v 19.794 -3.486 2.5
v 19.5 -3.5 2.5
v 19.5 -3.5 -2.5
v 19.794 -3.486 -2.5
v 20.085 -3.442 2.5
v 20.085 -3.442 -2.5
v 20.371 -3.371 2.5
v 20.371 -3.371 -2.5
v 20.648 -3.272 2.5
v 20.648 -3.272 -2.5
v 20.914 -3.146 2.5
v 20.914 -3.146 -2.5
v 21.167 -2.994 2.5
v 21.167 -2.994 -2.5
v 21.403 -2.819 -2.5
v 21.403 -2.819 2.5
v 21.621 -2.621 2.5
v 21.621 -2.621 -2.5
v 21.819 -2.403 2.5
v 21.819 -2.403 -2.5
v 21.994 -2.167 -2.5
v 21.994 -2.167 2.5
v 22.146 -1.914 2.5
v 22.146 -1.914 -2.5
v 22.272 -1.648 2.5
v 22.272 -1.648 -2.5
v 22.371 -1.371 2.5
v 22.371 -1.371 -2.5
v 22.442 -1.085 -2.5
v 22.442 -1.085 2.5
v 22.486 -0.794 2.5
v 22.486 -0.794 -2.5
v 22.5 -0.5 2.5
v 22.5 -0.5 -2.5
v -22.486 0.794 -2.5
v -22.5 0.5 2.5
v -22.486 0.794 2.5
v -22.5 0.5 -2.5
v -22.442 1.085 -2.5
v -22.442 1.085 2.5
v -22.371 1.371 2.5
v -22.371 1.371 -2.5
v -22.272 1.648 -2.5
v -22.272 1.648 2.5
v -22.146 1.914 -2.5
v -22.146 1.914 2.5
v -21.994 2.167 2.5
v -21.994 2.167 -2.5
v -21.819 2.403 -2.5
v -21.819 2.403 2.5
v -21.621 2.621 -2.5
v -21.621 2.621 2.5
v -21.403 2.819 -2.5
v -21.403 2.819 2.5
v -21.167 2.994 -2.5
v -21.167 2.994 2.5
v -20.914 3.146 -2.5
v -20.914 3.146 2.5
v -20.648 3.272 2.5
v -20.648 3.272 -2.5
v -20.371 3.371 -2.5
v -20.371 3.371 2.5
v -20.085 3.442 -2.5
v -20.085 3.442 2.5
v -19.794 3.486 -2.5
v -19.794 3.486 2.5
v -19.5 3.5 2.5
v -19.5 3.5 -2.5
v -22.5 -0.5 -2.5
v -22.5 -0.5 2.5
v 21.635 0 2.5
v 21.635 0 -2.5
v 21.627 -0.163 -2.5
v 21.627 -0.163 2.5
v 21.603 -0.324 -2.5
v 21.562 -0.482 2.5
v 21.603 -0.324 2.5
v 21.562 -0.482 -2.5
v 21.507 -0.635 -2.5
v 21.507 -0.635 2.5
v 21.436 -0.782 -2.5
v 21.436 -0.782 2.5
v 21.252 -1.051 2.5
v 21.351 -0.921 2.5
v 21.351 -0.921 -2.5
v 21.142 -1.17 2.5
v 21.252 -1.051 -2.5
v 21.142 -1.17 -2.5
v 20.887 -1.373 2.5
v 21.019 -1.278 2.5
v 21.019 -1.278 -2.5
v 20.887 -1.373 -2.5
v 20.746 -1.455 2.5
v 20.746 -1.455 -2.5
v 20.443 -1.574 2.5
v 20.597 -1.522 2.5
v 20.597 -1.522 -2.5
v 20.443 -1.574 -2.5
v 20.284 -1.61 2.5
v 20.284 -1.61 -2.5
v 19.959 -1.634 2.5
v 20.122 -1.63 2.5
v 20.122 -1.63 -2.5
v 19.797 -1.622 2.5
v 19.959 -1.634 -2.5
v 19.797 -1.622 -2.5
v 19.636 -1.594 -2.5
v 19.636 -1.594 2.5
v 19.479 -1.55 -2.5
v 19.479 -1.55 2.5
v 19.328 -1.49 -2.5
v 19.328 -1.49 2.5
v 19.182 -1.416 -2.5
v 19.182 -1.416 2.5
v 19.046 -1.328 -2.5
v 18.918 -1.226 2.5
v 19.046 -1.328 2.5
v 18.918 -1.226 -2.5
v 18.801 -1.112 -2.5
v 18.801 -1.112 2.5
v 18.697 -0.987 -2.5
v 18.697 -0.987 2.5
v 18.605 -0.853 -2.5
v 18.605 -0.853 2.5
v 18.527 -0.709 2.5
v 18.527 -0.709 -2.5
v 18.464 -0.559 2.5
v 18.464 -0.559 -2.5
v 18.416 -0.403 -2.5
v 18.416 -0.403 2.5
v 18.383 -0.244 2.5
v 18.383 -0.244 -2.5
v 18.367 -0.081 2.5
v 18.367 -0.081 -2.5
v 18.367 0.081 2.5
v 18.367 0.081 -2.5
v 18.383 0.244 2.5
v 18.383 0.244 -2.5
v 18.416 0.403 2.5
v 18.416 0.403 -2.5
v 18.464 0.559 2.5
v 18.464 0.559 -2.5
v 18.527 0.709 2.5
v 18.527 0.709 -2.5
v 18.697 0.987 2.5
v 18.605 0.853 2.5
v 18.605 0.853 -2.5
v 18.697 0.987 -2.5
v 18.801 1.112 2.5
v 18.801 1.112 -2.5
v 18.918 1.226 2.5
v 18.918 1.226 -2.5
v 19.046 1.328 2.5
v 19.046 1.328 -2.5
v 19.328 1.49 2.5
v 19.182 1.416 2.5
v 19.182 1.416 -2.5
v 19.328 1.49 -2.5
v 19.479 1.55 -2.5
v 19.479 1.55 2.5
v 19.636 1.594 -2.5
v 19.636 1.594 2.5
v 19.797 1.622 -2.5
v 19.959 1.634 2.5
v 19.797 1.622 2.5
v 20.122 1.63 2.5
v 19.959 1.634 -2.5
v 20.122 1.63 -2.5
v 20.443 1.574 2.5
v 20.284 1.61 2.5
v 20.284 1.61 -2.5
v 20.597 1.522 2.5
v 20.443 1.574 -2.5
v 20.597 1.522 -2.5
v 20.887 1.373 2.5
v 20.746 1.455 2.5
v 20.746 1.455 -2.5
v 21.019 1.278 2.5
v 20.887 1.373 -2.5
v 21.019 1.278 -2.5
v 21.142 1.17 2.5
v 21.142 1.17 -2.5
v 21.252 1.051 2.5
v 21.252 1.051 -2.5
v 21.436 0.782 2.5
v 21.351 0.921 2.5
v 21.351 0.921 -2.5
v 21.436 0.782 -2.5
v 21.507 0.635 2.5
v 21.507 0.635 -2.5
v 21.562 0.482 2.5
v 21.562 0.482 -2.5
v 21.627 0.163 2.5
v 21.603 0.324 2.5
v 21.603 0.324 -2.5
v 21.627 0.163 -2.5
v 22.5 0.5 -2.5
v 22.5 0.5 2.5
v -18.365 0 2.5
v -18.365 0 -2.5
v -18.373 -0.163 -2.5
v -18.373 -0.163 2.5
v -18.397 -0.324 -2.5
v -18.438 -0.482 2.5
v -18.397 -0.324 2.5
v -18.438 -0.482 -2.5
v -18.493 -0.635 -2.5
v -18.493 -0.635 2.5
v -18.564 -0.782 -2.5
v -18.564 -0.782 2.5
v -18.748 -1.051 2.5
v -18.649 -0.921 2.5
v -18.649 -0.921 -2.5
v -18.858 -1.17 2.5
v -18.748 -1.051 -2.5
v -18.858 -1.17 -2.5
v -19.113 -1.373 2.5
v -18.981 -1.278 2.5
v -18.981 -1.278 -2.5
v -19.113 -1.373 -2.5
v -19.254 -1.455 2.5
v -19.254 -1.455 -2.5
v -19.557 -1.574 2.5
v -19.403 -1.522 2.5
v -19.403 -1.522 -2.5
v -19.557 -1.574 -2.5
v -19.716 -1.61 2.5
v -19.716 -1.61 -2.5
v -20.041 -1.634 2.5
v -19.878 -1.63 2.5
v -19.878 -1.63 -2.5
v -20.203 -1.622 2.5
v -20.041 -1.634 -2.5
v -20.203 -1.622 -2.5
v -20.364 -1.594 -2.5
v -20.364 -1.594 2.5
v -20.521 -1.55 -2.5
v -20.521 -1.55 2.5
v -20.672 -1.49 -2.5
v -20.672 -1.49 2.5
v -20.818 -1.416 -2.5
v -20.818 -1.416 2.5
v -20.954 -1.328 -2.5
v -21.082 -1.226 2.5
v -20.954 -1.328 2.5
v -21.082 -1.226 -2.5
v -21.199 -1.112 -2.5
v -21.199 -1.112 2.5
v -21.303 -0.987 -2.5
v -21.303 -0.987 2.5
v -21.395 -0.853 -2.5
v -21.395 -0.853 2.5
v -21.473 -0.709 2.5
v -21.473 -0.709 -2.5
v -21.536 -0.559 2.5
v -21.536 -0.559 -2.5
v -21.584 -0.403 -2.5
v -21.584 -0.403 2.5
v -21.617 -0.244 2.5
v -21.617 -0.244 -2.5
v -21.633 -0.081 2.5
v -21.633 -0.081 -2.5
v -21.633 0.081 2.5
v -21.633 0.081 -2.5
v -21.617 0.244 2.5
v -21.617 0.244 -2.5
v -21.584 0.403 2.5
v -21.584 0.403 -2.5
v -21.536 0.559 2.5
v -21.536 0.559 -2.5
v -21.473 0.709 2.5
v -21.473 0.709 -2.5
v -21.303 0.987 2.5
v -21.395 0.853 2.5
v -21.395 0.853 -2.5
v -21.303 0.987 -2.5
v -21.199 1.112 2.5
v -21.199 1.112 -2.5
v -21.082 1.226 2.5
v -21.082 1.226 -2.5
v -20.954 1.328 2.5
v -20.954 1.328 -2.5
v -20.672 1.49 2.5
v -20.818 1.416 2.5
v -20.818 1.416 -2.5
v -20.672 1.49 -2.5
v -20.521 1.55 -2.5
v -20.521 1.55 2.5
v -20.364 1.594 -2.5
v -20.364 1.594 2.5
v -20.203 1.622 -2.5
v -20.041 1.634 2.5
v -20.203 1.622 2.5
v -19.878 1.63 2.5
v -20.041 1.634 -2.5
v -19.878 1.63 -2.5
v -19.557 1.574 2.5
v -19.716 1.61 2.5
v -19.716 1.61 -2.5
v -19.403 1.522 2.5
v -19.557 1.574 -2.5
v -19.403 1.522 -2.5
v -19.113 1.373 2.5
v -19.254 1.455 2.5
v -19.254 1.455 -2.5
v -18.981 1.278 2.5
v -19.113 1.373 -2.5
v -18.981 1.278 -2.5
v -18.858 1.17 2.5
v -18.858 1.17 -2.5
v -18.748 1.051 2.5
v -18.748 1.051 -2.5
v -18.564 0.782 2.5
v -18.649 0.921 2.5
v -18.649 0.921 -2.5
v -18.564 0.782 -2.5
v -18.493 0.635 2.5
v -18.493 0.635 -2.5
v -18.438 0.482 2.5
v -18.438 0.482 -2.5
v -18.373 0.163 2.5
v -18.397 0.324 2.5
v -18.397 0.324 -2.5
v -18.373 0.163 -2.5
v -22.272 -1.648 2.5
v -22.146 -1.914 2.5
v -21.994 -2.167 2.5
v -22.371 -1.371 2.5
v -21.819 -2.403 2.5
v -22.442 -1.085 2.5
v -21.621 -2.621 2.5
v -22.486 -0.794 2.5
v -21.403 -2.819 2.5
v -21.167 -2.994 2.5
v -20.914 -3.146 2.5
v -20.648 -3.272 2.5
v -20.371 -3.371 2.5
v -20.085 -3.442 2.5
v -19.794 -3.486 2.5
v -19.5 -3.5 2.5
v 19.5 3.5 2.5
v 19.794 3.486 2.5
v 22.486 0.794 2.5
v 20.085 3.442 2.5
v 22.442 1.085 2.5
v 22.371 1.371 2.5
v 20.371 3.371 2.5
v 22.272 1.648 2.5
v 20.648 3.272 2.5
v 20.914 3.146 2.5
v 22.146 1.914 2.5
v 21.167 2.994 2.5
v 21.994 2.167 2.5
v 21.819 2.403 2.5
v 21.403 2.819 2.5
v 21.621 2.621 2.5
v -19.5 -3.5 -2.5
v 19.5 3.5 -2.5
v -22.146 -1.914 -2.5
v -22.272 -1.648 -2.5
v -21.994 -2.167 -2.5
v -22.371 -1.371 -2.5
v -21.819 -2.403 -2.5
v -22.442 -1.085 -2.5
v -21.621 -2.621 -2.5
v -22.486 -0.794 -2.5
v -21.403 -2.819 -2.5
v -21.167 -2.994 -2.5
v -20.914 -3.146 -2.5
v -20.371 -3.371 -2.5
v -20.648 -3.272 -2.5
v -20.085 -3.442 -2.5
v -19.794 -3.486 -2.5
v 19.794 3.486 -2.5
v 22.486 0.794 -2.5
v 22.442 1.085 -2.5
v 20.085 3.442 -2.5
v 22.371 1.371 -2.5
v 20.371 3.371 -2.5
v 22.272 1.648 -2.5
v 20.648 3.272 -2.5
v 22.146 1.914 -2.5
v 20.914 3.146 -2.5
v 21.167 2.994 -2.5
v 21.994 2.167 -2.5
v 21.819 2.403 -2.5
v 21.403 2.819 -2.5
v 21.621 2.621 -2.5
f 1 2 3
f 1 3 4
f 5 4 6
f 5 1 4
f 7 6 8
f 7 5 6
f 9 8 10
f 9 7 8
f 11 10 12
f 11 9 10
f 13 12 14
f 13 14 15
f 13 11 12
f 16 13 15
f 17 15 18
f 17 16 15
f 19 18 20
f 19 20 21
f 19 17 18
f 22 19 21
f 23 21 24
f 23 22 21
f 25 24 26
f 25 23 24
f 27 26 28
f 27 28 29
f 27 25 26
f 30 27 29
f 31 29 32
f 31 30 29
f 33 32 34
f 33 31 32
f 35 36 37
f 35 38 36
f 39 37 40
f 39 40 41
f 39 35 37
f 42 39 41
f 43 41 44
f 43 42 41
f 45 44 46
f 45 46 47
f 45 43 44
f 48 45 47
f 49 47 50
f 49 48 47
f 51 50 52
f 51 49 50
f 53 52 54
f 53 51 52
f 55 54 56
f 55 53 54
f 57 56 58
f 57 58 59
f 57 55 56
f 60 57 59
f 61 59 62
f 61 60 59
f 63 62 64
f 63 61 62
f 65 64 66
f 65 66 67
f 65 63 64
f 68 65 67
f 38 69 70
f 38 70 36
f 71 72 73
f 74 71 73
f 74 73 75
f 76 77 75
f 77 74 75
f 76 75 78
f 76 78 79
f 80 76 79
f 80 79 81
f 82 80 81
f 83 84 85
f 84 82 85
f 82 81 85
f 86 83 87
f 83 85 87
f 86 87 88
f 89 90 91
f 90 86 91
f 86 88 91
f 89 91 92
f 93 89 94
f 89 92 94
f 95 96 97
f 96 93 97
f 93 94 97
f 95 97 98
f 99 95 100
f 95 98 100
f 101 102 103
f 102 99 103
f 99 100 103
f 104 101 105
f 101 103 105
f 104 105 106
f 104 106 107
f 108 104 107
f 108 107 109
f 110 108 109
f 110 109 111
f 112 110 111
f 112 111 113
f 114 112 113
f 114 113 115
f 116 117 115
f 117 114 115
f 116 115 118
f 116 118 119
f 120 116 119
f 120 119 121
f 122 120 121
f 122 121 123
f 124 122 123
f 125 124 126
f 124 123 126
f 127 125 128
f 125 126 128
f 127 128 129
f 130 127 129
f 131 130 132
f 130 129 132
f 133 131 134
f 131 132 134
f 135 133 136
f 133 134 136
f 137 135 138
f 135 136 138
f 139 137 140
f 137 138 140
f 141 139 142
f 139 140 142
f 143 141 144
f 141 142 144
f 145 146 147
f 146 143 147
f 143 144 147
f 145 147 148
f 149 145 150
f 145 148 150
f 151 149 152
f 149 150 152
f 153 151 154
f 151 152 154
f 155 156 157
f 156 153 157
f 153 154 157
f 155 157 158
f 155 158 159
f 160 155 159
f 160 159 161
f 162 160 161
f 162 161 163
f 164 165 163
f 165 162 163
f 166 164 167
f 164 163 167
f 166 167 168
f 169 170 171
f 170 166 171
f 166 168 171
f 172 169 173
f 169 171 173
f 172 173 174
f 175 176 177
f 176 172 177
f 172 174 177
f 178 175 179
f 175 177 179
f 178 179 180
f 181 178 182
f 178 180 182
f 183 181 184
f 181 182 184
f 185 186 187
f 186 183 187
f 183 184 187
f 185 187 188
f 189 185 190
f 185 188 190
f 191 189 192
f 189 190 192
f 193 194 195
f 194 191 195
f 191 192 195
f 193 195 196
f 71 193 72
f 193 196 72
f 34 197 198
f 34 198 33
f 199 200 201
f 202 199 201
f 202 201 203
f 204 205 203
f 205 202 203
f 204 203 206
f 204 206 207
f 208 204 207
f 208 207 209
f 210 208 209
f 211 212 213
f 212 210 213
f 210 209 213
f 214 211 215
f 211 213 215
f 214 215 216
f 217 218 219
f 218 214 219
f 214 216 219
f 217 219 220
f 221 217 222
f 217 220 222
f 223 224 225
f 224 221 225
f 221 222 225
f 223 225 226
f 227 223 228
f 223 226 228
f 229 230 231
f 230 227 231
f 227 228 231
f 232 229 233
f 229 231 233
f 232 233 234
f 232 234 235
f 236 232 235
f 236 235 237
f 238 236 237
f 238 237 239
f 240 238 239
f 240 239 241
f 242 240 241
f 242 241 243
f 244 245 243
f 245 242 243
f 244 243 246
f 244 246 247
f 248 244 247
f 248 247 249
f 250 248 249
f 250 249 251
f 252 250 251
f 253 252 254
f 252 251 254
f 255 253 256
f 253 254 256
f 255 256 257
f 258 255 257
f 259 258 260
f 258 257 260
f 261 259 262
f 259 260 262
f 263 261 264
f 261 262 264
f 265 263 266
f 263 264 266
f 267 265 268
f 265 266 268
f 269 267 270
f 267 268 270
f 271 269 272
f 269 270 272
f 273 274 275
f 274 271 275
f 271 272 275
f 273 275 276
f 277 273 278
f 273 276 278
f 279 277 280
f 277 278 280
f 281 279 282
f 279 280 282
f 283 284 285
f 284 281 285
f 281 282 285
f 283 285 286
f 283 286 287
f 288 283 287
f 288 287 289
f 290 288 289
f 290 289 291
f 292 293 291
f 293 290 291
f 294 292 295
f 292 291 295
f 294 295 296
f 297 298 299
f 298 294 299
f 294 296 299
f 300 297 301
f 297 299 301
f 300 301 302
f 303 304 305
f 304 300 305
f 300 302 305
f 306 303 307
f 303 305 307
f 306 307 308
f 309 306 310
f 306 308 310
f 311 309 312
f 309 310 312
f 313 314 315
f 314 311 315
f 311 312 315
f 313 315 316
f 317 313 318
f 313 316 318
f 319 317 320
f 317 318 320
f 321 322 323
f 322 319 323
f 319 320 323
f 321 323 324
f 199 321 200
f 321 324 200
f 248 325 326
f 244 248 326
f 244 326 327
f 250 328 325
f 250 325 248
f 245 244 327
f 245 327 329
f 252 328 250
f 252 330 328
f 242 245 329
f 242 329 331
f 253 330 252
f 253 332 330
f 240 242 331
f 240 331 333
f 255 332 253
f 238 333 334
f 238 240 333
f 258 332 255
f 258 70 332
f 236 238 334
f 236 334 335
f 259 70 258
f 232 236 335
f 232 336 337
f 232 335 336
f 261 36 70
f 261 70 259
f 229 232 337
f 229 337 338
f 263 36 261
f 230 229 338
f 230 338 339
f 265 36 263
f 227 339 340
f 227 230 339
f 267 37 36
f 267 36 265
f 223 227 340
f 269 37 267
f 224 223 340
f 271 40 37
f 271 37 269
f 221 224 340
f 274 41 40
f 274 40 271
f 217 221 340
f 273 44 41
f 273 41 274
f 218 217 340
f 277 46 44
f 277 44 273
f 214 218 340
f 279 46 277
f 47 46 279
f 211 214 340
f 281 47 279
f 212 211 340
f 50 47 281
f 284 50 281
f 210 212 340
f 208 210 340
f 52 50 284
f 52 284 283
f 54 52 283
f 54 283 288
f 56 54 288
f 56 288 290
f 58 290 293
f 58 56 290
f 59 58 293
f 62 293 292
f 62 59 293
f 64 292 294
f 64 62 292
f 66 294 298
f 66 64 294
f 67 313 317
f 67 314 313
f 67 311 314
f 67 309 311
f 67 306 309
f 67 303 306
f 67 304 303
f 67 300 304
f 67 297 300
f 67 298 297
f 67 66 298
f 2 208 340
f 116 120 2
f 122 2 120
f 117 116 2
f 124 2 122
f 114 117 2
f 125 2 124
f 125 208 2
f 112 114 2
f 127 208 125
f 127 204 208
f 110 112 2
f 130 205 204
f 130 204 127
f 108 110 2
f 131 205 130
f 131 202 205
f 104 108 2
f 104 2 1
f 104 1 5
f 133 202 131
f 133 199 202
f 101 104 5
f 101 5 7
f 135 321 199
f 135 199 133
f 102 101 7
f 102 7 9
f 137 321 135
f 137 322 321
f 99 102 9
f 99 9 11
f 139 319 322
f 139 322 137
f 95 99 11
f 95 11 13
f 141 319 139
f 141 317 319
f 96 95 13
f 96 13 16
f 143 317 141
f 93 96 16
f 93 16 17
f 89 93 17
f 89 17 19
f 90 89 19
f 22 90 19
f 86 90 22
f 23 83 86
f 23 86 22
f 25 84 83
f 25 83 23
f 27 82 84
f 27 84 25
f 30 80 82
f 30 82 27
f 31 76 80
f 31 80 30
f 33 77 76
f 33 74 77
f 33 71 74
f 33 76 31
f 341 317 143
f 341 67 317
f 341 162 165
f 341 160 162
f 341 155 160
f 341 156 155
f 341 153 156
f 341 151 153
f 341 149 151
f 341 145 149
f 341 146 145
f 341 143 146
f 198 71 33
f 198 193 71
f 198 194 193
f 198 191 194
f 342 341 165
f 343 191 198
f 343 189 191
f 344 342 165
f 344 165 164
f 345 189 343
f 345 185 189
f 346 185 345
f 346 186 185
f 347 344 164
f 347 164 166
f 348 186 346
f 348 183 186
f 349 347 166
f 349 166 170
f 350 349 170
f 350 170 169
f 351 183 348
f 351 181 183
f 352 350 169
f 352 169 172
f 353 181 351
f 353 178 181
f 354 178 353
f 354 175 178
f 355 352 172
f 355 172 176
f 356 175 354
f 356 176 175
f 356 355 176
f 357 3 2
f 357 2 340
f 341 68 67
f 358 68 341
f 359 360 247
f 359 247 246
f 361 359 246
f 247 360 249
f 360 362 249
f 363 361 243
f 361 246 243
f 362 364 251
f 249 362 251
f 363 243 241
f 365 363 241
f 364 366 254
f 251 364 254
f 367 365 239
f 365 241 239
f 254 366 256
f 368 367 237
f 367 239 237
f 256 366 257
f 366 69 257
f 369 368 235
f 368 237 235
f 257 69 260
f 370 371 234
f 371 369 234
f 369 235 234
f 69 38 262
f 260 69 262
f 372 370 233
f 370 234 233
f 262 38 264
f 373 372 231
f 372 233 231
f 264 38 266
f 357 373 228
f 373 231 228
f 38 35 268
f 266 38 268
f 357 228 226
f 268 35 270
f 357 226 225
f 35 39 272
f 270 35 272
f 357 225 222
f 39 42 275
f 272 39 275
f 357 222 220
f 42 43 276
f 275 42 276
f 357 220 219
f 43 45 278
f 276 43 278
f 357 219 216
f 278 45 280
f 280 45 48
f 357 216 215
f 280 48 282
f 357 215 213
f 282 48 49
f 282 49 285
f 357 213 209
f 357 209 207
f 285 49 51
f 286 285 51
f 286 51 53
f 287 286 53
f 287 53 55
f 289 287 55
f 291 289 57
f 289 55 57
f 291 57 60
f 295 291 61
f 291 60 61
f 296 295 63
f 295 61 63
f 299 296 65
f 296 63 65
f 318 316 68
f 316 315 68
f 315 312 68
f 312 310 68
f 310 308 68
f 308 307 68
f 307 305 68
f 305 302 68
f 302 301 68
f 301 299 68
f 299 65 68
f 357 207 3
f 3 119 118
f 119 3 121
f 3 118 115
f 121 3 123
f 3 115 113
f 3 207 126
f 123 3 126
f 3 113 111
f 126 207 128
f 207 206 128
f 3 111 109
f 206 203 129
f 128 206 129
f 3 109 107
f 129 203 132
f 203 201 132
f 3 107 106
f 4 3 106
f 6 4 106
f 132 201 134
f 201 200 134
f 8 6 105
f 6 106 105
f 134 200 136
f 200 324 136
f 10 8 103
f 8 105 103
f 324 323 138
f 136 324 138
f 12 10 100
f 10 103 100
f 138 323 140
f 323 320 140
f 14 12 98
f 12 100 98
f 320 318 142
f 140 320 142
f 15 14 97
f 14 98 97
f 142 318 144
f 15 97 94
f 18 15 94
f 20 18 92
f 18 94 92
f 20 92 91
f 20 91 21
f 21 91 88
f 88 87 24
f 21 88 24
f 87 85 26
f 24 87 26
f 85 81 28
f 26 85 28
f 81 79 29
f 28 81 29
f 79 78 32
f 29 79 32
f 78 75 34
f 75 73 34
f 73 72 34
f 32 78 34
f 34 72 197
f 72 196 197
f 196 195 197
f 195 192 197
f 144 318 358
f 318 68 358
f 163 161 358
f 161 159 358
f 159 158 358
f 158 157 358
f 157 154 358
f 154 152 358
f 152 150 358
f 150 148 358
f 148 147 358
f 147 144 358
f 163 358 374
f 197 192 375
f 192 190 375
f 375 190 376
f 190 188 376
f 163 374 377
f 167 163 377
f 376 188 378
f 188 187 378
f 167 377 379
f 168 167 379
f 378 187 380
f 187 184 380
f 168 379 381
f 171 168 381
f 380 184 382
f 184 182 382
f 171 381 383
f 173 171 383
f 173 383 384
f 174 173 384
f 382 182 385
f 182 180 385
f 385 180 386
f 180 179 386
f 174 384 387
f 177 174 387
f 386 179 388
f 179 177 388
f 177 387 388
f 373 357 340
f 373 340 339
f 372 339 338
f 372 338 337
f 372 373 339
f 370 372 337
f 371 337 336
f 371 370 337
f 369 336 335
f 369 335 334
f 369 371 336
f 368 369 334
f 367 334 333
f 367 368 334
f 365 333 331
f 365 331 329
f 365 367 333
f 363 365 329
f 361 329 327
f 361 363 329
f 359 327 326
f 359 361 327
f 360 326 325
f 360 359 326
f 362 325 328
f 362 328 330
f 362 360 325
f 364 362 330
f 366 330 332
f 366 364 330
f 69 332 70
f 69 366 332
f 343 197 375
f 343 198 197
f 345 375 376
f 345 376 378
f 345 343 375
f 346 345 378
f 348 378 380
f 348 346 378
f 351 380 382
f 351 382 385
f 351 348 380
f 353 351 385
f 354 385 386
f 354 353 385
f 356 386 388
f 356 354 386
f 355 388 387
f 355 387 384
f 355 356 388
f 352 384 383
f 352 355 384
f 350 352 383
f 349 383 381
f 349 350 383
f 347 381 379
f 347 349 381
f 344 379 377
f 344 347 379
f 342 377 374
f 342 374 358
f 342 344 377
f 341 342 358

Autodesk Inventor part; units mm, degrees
ref_plane "YZ Plane" through (0, 0, 0) normal (1, 0, 0) x (0, 1, 0)
ref_plane "XZ Plane" through (0, 0, 0) normal (0, 1, 0) x (-1, 0, 0)
ref_plane "XY Plane" through (0, 0, 0) normal (0, 0, 1) x (1, 0, 0)
sketch "スケッチ1" plane through (0, 0, 0) normal (0, 0, 1) x (1, 0, 0)
  line L0 (-22.5, 3.5) -> (22.5, 3.5)
  line L1 (22.5, 3.5) -> (22.5, -3.5)
  line L2 (22.5, -3.5) -> (-22.5, -3.5)
  line L3 (-22.5, -3.5) -> (-22.5, 3.5)
  line L4 (-22.5, 3.5) -> (22.5, -3.5) construction
  line L5 (22.5, 3.5) -> (-22.5, -3.5) construction
  line L6 (0, -6.37) -> (0, 6.37) construction
  line L7 (-34.37, 0) -> (34.37, 0) construction
  circle A0 centre (-20, 0) radius 4.55
  line L8 (22.5, -3.5) -> (22.5, 3.5)
  circle A1 centre (20, 0) radius 4.55
  circle A2 centre (-20, 0) radius 1.635
  circle A3 centre (20, 0) radius 1.635
  line L9 (14, 3.5) -> (14, -3.5)
  line L10 (16, 3.5) -> (16, -3.5)
  point P0 (0, 0)
  point P1 (-17.0927, 3.5)
  point P2 (-22.9073, 3.5)
  point P3 (-22.9073, -3.5)
  point P4 (-17.0927, -3.5)
  point P5 (17.0927, 3.5)
  point P6 (17.0927, -3.5)
  point P7 (22.9073, -3.5)
  point P8 (22.9073, 3.5)
  dimension "d1" = 7
  dimension "d2" = 20
  dimension "d3" = 45
  dimension "d4" = 9.1
  dimension "d12" = 3.27
  dimension "d13" = 3.27
  dimension "d14" = 6
  dimension "d15" = 2
extrude "押し出し1" add sketch "スケッチ1" along normal mid plane 5 contours L9 L2 A0 L0 | L0 L10 A1 L2 L9 | L0 A1 L10 | A0 L2 L3 L0 | L0 L1 L2 A1 L10 | L10 A1 | L10 A1 L2 picked at (-19.7985, 2.8744)
fillet "フィレット1" radius 3 4 edges at (-22.5, 3.5, 0) (-22.5, -3.5, 0) (22.5, -3.5, 0) (22.5, 3.5, 0)
properties part number "link_arm_1"
